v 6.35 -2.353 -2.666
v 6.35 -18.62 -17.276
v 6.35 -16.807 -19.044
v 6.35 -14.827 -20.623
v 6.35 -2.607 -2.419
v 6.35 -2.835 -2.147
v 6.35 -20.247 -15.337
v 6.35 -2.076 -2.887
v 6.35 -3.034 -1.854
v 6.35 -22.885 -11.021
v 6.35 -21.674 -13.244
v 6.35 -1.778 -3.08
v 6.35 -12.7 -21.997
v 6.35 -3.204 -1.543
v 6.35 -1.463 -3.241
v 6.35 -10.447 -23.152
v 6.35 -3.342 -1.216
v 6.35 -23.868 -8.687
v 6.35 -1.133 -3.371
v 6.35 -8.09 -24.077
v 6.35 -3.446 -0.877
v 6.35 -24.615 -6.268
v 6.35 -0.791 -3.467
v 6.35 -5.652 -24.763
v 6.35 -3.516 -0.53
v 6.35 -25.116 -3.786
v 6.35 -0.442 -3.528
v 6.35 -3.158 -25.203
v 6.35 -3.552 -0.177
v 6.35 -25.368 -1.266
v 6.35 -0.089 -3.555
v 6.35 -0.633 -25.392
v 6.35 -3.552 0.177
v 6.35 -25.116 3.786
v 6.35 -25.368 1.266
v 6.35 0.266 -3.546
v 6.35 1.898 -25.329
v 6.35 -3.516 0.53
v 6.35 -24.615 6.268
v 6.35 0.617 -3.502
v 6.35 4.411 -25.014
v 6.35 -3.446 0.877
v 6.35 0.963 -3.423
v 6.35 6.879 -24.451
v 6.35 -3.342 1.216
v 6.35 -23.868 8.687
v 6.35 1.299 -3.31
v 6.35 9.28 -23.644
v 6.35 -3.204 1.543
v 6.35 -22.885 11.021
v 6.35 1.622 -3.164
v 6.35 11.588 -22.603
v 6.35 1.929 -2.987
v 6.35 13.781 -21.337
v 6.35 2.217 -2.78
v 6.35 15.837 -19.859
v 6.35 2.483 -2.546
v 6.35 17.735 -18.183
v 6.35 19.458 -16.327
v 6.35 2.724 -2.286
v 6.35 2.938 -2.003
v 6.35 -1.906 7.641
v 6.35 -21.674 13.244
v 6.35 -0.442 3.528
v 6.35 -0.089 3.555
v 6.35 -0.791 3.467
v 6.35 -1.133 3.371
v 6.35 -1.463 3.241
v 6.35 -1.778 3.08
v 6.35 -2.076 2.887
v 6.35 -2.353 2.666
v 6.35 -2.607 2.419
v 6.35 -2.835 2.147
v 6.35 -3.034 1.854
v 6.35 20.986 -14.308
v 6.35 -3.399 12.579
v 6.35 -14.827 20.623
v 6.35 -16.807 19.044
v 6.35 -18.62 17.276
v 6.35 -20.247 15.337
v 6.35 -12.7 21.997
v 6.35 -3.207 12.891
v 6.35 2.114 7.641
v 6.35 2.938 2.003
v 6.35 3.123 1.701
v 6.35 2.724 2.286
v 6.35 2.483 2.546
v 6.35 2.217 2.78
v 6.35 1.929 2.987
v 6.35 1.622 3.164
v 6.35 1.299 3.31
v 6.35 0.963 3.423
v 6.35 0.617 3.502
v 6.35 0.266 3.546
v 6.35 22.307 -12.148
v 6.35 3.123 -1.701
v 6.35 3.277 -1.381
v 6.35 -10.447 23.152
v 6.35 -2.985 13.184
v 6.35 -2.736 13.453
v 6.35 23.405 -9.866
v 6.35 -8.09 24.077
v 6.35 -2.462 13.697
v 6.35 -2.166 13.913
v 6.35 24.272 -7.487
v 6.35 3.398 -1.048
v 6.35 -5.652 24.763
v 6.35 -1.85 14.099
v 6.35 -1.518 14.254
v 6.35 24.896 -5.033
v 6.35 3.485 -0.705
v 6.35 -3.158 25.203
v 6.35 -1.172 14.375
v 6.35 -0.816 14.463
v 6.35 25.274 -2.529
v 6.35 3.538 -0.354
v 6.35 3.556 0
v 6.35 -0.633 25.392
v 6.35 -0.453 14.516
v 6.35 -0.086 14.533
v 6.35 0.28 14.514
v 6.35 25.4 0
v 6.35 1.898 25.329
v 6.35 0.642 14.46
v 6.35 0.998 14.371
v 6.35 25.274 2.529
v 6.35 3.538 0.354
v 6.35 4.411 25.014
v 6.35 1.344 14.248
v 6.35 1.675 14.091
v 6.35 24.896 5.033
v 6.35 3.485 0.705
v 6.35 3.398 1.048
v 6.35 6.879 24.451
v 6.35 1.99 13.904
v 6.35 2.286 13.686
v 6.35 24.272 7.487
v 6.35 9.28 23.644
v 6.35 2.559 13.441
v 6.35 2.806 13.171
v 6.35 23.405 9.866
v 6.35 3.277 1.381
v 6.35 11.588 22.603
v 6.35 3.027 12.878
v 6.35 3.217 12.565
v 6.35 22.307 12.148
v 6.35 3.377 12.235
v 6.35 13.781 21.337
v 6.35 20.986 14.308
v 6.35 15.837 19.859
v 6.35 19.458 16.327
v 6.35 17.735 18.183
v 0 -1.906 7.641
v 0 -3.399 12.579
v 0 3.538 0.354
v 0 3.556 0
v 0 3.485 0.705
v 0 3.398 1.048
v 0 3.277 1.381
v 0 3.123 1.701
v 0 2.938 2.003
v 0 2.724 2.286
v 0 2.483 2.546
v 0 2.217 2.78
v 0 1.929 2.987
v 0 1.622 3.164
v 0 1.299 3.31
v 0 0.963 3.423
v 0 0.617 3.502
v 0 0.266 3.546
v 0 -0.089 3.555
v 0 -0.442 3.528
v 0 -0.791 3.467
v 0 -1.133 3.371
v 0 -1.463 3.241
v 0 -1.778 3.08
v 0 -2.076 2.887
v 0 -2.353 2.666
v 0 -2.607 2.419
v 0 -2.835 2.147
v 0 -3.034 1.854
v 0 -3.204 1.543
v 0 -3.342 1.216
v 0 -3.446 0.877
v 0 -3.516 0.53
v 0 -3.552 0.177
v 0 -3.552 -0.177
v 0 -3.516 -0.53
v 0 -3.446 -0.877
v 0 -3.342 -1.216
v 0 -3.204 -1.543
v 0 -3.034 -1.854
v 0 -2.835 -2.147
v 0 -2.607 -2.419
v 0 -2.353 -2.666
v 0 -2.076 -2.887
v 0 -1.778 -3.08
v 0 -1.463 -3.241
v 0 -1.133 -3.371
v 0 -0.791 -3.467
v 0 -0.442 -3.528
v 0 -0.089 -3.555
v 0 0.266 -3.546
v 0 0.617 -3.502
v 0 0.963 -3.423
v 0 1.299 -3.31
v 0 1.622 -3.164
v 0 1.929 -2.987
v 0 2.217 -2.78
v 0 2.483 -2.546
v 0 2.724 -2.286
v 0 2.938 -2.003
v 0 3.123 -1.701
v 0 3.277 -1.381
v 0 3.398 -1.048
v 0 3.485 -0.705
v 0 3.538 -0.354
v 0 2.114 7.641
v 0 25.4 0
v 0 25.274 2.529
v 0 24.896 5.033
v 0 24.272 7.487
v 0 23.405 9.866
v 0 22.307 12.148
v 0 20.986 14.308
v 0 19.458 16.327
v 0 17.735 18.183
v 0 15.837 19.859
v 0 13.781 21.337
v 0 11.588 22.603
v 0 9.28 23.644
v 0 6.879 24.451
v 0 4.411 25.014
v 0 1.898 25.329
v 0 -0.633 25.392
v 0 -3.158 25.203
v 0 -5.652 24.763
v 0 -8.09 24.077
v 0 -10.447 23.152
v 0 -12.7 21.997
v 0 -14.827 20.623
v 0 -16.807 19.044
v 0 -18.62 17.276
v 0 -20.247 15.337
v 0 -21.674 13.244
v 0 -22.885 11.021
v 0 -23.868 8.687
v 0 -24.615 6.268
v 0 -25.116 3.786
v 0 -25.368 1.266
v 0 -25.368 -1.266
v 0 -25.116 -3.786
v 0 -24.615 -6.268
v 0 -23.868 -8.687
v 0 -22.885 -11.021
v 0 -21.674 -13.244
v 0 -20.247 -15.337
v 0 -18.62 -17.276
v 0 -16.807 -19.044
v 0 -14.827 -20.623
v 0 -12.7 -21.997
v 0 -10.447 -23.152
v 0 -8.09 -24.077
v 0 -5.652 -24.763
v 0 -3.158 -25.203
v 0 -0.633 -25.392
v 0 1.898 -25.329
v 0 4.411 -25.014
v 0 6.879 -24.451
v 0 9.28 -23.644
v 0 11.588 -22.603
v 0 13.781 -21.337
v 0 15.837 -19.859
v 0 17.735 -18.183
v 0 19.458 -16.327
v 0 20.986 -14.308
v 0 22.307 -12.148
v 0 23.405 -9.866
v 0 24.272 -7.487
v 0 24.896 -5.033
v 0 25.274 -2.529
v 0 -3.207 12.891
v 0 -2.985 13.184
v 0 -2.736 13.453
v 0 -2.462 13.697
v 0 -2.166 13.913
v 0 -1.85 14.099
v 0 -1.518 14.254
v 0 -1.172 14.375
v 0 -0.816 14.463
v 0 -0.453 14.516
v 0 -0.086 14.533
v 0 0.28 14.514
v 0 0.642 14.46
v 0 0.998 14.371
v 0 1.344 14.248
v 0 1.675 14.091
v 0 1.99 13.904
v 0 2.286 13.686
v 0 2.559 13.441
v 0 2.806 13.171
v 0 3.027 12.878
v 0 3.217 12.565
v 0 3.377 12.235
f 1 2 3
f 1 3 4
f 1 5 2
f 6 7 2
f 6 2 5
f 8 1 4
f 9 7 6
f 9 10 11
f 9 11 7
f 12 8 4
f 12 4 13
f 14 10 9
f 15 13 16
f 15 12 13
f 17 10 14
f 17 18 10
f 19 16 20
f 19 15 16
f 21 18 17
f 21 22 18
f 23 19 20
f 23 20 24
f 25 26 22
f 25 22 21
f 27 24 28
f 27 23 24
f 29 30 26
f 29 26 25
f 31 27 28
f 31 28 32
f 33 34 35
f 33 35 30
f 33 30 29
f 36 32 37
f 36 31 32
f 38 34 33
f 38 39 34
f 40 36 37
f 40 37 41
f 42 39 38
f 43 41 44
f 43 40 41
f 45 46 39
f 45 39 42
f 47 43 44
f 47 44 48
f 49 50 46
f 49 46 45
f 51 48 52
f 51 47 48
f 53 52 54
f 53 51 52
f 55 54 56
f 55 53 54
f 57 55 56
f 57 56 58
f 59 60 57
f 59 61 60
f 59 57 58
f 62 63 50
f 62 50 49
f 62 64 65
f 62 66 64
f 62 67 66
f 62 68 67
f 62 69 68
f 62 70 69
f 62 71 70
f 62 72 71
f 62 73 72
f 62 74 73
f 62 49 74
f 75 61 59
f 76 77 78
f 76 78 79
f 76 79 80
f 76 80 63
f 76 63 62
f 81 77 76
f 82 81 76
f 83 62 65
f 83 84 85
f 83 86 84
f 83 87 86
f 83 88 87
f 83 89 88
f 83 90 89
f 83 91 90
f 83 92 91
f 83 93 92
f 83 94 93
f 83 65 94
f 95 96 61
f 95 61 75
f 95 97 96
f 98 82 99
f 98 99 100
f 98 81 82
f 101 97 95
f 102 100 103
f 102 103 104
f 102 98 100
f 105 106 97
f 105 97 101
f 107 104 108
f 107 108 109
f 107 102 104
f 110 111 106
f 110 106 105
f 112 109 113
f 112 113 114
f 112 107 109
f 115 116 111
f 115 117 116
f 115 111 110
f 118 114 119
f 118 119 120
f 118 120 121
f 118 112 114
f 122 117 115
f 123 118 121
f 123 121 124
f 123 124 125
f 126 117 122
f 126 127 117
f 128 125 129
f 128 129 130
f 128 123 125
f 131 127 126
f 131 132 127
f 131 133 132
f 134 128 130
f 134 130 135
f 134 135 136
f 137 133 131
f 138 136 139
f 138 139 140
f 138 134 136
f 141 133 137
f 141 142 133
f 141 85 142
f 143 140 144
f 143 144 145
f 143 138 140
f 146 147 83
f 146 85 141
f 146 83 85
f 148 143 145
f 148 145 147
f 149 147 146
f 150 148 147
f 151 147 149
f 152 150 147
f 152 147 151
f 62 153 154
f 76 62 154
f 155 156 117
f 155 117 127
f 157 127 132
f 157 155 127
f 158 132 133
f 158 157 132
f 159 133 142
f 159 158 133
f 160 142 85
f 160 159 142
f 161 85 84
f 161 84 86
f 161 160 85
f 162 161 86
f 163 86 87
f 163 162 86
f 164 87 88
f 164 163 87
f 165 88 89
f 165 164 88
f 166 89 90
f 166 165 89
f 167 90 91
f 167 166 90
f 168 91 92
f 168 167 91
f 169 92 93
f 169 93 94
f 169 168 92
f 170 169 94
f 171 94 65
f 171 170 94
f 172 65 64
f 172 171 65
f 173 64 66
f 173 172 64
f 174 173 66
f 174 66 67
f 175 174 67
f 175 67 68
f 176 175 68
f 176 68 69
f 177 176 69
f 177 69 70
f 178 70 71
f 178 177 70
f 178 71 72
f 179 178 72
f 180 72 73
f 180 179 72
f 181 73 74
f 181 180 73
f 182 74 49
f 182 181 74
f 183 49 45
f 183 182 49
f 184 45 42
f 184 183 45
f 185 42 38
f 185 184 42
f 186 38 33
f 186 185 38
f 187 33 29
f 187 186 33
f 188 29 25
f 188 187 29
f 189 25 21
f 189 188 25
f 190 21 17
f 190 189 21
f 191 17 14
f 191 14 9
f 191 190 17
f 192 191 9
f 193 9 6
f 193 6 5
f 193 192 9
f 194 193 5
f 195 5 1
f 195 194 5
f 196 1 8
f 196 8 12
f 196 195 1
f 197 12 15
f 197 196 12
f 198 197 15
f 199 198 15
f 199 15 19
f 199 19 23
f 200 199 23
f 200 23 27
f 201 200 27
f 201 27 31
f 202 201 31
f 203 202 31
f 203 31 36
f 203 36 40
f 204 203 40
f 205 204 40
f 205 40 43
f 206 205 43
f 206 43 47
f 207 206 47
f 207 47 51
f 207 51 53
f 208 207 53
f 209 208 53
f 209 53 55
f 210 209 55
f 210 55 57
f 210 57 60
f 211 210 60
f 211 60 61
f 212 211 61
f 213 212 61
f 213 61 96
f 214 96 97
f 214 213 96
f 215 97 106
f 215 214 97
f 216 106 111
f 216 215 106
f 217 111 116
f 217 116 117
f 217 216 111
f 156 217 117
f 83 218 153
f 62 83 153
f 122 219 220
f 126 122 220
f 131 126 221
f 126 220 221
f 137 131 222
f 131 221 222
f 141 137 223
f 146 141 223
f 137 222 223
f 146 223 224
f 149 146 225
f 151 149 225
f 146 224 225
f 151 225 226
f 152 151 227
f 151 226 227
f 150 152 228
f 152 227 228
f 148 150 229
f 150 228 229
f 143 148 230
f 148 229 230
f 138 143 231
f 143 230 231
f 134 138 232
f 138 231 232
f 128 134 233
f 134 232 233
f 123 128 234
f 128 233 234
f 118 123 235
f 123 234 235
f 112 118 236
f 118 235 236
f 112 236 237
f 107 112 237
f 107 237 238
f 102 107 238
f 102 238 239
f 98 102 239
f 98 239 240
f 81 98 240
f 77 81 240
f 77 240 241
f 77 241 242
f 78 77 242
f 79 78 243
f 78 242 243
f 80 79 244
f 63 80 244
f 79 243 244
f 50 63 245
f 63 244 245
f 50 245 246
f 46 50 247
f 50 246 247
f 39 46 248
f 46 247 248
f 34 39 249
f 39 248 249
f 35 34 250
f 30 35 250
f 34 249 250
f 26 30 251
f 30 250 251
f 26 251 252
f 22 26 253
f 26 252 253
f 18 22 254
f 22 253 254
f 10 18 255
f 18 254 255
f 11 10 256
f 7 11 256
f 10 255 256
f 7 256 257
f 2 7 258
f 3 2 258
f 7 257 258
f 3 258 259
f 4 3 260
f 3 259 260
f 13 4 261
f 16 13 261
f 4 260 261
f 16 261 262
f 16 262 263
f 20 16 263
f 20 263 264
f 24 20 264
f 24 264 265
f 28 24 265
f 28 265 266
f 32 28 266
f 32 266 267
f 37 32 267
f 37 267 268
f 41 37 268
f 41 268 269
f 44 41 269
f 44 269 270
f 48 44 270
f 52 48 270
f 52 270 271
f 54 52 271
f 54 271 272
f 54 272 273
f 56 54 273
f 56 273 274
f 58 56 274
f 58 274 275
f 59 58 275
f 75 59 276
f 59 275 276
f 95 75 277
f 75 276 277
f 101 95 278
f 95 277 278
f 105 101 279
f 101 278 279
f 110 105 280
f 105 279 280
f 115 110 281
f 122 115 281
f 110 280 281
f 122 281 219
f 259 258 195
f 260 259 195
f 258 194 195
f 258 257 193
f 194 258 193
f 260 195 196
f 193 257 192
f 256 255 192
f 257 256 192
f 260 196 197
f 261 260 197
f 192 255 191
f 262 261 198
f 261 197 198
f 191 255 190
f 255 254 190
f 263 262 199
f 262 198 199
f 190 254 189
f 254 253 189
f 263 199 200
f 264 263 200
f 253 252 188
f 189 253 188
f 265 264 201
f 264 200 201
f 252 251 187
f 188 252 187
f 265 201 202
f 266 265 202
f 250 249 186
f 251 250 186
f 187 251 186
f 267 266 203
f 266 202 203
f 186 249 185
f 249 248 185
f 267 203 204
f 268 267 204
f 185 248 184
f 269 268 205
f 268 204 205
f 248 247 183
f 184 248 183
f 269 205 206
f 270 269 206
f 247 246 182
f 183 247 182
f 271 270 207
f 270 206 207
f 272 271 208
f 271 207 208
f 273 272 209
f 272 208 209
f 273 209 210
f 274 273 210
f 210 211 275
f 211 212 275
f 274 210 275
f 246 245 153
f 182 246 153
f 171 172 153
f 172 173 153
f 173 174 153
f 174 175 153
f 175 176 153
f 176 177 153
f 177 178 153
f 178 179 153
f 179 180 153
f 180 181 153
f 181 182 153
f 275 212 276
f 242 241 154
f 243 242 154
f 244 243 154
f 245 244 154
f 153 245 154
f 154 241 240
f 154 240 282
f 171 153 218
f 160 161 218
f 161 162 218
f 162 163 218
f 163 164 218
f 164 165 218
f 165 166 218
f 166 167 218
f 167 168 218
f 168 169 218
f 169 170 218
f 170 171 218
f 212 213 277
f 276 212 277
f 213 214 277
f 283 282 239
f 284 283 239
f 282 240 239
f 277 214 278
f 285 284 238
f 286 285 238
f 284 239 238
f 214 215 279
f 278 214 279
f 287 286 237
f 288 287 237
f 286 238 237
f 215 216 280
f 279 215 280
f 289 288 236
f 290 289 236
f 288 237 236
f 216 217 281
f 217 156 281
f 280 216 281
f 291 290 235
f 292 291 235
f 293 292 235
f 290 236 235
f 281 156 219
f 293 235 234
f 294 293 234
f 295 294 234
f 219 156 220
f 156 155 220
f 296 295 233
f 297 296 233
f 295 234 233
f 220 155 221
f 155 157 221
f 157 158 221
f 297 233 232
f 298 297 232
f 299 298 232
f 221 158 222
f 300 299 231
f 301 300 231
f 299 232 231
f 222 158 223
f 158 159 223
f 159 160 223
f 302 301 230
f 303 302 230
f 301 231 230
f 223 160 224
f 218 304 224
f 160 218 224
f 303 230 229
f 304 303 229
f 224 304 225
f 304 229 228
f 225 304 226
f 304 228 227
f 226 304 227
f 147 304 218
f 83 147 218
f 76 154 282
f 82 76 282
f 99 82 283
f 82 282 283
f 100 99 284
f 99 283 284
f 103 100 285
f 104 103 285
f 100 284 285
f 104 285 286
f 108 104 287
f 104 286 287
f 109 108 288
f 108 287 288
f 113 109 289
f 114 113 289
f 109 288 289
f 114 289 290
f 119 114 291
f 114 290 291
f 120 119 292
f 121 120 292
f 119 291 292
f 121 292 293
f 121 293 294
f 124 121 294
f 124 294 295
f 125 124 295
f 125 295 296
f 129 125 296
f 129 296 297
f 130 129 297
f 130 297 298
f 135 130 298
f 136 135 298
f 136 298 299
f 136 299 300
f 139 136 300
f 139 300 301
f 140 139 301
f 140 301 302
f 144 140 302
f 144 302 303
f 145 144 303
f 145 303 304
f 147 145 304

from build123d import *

# Parameters (mm, degrees)
F0_R     = 25.4
F0_R_2   = 3.556
F1_DEPTH = 6.35
F3_DEPTH = 76.2


with BuildPart() as f1:
    # F0 (on Right) → F1 (new body)
    with BuildSketch(Plane.YZ):
        Circle(F0_R)
        Circle(F0_R_2, mode=Mode.SUBTRACT)
    extrude(amount=F1_DEPTH)

    # F2 (on face) → F3 (cut)
    with BuildSketch(Plane(origin=(0, 0, 0), x_dir=(0, -1, 0), z_dir=(-1, 0, 0))):
        with BuildLine():
            Line((-3.376935, 12.234649), (-2.113646, 7.640875))
            Line((-2.113646, 7.640875), (1.905905, 7.640875))
            Line((1.905905, 7.640875), (3.398881, 12.579182))
            ThreePointArc((3.398881, 12.579182), (-0.096865, 14.52771), (-3.376935, 12.234649))
        make_face()
    extrude(amount=-F3_DEPTH, mode=Mode.SUBTRACT)


solid = f1.part
